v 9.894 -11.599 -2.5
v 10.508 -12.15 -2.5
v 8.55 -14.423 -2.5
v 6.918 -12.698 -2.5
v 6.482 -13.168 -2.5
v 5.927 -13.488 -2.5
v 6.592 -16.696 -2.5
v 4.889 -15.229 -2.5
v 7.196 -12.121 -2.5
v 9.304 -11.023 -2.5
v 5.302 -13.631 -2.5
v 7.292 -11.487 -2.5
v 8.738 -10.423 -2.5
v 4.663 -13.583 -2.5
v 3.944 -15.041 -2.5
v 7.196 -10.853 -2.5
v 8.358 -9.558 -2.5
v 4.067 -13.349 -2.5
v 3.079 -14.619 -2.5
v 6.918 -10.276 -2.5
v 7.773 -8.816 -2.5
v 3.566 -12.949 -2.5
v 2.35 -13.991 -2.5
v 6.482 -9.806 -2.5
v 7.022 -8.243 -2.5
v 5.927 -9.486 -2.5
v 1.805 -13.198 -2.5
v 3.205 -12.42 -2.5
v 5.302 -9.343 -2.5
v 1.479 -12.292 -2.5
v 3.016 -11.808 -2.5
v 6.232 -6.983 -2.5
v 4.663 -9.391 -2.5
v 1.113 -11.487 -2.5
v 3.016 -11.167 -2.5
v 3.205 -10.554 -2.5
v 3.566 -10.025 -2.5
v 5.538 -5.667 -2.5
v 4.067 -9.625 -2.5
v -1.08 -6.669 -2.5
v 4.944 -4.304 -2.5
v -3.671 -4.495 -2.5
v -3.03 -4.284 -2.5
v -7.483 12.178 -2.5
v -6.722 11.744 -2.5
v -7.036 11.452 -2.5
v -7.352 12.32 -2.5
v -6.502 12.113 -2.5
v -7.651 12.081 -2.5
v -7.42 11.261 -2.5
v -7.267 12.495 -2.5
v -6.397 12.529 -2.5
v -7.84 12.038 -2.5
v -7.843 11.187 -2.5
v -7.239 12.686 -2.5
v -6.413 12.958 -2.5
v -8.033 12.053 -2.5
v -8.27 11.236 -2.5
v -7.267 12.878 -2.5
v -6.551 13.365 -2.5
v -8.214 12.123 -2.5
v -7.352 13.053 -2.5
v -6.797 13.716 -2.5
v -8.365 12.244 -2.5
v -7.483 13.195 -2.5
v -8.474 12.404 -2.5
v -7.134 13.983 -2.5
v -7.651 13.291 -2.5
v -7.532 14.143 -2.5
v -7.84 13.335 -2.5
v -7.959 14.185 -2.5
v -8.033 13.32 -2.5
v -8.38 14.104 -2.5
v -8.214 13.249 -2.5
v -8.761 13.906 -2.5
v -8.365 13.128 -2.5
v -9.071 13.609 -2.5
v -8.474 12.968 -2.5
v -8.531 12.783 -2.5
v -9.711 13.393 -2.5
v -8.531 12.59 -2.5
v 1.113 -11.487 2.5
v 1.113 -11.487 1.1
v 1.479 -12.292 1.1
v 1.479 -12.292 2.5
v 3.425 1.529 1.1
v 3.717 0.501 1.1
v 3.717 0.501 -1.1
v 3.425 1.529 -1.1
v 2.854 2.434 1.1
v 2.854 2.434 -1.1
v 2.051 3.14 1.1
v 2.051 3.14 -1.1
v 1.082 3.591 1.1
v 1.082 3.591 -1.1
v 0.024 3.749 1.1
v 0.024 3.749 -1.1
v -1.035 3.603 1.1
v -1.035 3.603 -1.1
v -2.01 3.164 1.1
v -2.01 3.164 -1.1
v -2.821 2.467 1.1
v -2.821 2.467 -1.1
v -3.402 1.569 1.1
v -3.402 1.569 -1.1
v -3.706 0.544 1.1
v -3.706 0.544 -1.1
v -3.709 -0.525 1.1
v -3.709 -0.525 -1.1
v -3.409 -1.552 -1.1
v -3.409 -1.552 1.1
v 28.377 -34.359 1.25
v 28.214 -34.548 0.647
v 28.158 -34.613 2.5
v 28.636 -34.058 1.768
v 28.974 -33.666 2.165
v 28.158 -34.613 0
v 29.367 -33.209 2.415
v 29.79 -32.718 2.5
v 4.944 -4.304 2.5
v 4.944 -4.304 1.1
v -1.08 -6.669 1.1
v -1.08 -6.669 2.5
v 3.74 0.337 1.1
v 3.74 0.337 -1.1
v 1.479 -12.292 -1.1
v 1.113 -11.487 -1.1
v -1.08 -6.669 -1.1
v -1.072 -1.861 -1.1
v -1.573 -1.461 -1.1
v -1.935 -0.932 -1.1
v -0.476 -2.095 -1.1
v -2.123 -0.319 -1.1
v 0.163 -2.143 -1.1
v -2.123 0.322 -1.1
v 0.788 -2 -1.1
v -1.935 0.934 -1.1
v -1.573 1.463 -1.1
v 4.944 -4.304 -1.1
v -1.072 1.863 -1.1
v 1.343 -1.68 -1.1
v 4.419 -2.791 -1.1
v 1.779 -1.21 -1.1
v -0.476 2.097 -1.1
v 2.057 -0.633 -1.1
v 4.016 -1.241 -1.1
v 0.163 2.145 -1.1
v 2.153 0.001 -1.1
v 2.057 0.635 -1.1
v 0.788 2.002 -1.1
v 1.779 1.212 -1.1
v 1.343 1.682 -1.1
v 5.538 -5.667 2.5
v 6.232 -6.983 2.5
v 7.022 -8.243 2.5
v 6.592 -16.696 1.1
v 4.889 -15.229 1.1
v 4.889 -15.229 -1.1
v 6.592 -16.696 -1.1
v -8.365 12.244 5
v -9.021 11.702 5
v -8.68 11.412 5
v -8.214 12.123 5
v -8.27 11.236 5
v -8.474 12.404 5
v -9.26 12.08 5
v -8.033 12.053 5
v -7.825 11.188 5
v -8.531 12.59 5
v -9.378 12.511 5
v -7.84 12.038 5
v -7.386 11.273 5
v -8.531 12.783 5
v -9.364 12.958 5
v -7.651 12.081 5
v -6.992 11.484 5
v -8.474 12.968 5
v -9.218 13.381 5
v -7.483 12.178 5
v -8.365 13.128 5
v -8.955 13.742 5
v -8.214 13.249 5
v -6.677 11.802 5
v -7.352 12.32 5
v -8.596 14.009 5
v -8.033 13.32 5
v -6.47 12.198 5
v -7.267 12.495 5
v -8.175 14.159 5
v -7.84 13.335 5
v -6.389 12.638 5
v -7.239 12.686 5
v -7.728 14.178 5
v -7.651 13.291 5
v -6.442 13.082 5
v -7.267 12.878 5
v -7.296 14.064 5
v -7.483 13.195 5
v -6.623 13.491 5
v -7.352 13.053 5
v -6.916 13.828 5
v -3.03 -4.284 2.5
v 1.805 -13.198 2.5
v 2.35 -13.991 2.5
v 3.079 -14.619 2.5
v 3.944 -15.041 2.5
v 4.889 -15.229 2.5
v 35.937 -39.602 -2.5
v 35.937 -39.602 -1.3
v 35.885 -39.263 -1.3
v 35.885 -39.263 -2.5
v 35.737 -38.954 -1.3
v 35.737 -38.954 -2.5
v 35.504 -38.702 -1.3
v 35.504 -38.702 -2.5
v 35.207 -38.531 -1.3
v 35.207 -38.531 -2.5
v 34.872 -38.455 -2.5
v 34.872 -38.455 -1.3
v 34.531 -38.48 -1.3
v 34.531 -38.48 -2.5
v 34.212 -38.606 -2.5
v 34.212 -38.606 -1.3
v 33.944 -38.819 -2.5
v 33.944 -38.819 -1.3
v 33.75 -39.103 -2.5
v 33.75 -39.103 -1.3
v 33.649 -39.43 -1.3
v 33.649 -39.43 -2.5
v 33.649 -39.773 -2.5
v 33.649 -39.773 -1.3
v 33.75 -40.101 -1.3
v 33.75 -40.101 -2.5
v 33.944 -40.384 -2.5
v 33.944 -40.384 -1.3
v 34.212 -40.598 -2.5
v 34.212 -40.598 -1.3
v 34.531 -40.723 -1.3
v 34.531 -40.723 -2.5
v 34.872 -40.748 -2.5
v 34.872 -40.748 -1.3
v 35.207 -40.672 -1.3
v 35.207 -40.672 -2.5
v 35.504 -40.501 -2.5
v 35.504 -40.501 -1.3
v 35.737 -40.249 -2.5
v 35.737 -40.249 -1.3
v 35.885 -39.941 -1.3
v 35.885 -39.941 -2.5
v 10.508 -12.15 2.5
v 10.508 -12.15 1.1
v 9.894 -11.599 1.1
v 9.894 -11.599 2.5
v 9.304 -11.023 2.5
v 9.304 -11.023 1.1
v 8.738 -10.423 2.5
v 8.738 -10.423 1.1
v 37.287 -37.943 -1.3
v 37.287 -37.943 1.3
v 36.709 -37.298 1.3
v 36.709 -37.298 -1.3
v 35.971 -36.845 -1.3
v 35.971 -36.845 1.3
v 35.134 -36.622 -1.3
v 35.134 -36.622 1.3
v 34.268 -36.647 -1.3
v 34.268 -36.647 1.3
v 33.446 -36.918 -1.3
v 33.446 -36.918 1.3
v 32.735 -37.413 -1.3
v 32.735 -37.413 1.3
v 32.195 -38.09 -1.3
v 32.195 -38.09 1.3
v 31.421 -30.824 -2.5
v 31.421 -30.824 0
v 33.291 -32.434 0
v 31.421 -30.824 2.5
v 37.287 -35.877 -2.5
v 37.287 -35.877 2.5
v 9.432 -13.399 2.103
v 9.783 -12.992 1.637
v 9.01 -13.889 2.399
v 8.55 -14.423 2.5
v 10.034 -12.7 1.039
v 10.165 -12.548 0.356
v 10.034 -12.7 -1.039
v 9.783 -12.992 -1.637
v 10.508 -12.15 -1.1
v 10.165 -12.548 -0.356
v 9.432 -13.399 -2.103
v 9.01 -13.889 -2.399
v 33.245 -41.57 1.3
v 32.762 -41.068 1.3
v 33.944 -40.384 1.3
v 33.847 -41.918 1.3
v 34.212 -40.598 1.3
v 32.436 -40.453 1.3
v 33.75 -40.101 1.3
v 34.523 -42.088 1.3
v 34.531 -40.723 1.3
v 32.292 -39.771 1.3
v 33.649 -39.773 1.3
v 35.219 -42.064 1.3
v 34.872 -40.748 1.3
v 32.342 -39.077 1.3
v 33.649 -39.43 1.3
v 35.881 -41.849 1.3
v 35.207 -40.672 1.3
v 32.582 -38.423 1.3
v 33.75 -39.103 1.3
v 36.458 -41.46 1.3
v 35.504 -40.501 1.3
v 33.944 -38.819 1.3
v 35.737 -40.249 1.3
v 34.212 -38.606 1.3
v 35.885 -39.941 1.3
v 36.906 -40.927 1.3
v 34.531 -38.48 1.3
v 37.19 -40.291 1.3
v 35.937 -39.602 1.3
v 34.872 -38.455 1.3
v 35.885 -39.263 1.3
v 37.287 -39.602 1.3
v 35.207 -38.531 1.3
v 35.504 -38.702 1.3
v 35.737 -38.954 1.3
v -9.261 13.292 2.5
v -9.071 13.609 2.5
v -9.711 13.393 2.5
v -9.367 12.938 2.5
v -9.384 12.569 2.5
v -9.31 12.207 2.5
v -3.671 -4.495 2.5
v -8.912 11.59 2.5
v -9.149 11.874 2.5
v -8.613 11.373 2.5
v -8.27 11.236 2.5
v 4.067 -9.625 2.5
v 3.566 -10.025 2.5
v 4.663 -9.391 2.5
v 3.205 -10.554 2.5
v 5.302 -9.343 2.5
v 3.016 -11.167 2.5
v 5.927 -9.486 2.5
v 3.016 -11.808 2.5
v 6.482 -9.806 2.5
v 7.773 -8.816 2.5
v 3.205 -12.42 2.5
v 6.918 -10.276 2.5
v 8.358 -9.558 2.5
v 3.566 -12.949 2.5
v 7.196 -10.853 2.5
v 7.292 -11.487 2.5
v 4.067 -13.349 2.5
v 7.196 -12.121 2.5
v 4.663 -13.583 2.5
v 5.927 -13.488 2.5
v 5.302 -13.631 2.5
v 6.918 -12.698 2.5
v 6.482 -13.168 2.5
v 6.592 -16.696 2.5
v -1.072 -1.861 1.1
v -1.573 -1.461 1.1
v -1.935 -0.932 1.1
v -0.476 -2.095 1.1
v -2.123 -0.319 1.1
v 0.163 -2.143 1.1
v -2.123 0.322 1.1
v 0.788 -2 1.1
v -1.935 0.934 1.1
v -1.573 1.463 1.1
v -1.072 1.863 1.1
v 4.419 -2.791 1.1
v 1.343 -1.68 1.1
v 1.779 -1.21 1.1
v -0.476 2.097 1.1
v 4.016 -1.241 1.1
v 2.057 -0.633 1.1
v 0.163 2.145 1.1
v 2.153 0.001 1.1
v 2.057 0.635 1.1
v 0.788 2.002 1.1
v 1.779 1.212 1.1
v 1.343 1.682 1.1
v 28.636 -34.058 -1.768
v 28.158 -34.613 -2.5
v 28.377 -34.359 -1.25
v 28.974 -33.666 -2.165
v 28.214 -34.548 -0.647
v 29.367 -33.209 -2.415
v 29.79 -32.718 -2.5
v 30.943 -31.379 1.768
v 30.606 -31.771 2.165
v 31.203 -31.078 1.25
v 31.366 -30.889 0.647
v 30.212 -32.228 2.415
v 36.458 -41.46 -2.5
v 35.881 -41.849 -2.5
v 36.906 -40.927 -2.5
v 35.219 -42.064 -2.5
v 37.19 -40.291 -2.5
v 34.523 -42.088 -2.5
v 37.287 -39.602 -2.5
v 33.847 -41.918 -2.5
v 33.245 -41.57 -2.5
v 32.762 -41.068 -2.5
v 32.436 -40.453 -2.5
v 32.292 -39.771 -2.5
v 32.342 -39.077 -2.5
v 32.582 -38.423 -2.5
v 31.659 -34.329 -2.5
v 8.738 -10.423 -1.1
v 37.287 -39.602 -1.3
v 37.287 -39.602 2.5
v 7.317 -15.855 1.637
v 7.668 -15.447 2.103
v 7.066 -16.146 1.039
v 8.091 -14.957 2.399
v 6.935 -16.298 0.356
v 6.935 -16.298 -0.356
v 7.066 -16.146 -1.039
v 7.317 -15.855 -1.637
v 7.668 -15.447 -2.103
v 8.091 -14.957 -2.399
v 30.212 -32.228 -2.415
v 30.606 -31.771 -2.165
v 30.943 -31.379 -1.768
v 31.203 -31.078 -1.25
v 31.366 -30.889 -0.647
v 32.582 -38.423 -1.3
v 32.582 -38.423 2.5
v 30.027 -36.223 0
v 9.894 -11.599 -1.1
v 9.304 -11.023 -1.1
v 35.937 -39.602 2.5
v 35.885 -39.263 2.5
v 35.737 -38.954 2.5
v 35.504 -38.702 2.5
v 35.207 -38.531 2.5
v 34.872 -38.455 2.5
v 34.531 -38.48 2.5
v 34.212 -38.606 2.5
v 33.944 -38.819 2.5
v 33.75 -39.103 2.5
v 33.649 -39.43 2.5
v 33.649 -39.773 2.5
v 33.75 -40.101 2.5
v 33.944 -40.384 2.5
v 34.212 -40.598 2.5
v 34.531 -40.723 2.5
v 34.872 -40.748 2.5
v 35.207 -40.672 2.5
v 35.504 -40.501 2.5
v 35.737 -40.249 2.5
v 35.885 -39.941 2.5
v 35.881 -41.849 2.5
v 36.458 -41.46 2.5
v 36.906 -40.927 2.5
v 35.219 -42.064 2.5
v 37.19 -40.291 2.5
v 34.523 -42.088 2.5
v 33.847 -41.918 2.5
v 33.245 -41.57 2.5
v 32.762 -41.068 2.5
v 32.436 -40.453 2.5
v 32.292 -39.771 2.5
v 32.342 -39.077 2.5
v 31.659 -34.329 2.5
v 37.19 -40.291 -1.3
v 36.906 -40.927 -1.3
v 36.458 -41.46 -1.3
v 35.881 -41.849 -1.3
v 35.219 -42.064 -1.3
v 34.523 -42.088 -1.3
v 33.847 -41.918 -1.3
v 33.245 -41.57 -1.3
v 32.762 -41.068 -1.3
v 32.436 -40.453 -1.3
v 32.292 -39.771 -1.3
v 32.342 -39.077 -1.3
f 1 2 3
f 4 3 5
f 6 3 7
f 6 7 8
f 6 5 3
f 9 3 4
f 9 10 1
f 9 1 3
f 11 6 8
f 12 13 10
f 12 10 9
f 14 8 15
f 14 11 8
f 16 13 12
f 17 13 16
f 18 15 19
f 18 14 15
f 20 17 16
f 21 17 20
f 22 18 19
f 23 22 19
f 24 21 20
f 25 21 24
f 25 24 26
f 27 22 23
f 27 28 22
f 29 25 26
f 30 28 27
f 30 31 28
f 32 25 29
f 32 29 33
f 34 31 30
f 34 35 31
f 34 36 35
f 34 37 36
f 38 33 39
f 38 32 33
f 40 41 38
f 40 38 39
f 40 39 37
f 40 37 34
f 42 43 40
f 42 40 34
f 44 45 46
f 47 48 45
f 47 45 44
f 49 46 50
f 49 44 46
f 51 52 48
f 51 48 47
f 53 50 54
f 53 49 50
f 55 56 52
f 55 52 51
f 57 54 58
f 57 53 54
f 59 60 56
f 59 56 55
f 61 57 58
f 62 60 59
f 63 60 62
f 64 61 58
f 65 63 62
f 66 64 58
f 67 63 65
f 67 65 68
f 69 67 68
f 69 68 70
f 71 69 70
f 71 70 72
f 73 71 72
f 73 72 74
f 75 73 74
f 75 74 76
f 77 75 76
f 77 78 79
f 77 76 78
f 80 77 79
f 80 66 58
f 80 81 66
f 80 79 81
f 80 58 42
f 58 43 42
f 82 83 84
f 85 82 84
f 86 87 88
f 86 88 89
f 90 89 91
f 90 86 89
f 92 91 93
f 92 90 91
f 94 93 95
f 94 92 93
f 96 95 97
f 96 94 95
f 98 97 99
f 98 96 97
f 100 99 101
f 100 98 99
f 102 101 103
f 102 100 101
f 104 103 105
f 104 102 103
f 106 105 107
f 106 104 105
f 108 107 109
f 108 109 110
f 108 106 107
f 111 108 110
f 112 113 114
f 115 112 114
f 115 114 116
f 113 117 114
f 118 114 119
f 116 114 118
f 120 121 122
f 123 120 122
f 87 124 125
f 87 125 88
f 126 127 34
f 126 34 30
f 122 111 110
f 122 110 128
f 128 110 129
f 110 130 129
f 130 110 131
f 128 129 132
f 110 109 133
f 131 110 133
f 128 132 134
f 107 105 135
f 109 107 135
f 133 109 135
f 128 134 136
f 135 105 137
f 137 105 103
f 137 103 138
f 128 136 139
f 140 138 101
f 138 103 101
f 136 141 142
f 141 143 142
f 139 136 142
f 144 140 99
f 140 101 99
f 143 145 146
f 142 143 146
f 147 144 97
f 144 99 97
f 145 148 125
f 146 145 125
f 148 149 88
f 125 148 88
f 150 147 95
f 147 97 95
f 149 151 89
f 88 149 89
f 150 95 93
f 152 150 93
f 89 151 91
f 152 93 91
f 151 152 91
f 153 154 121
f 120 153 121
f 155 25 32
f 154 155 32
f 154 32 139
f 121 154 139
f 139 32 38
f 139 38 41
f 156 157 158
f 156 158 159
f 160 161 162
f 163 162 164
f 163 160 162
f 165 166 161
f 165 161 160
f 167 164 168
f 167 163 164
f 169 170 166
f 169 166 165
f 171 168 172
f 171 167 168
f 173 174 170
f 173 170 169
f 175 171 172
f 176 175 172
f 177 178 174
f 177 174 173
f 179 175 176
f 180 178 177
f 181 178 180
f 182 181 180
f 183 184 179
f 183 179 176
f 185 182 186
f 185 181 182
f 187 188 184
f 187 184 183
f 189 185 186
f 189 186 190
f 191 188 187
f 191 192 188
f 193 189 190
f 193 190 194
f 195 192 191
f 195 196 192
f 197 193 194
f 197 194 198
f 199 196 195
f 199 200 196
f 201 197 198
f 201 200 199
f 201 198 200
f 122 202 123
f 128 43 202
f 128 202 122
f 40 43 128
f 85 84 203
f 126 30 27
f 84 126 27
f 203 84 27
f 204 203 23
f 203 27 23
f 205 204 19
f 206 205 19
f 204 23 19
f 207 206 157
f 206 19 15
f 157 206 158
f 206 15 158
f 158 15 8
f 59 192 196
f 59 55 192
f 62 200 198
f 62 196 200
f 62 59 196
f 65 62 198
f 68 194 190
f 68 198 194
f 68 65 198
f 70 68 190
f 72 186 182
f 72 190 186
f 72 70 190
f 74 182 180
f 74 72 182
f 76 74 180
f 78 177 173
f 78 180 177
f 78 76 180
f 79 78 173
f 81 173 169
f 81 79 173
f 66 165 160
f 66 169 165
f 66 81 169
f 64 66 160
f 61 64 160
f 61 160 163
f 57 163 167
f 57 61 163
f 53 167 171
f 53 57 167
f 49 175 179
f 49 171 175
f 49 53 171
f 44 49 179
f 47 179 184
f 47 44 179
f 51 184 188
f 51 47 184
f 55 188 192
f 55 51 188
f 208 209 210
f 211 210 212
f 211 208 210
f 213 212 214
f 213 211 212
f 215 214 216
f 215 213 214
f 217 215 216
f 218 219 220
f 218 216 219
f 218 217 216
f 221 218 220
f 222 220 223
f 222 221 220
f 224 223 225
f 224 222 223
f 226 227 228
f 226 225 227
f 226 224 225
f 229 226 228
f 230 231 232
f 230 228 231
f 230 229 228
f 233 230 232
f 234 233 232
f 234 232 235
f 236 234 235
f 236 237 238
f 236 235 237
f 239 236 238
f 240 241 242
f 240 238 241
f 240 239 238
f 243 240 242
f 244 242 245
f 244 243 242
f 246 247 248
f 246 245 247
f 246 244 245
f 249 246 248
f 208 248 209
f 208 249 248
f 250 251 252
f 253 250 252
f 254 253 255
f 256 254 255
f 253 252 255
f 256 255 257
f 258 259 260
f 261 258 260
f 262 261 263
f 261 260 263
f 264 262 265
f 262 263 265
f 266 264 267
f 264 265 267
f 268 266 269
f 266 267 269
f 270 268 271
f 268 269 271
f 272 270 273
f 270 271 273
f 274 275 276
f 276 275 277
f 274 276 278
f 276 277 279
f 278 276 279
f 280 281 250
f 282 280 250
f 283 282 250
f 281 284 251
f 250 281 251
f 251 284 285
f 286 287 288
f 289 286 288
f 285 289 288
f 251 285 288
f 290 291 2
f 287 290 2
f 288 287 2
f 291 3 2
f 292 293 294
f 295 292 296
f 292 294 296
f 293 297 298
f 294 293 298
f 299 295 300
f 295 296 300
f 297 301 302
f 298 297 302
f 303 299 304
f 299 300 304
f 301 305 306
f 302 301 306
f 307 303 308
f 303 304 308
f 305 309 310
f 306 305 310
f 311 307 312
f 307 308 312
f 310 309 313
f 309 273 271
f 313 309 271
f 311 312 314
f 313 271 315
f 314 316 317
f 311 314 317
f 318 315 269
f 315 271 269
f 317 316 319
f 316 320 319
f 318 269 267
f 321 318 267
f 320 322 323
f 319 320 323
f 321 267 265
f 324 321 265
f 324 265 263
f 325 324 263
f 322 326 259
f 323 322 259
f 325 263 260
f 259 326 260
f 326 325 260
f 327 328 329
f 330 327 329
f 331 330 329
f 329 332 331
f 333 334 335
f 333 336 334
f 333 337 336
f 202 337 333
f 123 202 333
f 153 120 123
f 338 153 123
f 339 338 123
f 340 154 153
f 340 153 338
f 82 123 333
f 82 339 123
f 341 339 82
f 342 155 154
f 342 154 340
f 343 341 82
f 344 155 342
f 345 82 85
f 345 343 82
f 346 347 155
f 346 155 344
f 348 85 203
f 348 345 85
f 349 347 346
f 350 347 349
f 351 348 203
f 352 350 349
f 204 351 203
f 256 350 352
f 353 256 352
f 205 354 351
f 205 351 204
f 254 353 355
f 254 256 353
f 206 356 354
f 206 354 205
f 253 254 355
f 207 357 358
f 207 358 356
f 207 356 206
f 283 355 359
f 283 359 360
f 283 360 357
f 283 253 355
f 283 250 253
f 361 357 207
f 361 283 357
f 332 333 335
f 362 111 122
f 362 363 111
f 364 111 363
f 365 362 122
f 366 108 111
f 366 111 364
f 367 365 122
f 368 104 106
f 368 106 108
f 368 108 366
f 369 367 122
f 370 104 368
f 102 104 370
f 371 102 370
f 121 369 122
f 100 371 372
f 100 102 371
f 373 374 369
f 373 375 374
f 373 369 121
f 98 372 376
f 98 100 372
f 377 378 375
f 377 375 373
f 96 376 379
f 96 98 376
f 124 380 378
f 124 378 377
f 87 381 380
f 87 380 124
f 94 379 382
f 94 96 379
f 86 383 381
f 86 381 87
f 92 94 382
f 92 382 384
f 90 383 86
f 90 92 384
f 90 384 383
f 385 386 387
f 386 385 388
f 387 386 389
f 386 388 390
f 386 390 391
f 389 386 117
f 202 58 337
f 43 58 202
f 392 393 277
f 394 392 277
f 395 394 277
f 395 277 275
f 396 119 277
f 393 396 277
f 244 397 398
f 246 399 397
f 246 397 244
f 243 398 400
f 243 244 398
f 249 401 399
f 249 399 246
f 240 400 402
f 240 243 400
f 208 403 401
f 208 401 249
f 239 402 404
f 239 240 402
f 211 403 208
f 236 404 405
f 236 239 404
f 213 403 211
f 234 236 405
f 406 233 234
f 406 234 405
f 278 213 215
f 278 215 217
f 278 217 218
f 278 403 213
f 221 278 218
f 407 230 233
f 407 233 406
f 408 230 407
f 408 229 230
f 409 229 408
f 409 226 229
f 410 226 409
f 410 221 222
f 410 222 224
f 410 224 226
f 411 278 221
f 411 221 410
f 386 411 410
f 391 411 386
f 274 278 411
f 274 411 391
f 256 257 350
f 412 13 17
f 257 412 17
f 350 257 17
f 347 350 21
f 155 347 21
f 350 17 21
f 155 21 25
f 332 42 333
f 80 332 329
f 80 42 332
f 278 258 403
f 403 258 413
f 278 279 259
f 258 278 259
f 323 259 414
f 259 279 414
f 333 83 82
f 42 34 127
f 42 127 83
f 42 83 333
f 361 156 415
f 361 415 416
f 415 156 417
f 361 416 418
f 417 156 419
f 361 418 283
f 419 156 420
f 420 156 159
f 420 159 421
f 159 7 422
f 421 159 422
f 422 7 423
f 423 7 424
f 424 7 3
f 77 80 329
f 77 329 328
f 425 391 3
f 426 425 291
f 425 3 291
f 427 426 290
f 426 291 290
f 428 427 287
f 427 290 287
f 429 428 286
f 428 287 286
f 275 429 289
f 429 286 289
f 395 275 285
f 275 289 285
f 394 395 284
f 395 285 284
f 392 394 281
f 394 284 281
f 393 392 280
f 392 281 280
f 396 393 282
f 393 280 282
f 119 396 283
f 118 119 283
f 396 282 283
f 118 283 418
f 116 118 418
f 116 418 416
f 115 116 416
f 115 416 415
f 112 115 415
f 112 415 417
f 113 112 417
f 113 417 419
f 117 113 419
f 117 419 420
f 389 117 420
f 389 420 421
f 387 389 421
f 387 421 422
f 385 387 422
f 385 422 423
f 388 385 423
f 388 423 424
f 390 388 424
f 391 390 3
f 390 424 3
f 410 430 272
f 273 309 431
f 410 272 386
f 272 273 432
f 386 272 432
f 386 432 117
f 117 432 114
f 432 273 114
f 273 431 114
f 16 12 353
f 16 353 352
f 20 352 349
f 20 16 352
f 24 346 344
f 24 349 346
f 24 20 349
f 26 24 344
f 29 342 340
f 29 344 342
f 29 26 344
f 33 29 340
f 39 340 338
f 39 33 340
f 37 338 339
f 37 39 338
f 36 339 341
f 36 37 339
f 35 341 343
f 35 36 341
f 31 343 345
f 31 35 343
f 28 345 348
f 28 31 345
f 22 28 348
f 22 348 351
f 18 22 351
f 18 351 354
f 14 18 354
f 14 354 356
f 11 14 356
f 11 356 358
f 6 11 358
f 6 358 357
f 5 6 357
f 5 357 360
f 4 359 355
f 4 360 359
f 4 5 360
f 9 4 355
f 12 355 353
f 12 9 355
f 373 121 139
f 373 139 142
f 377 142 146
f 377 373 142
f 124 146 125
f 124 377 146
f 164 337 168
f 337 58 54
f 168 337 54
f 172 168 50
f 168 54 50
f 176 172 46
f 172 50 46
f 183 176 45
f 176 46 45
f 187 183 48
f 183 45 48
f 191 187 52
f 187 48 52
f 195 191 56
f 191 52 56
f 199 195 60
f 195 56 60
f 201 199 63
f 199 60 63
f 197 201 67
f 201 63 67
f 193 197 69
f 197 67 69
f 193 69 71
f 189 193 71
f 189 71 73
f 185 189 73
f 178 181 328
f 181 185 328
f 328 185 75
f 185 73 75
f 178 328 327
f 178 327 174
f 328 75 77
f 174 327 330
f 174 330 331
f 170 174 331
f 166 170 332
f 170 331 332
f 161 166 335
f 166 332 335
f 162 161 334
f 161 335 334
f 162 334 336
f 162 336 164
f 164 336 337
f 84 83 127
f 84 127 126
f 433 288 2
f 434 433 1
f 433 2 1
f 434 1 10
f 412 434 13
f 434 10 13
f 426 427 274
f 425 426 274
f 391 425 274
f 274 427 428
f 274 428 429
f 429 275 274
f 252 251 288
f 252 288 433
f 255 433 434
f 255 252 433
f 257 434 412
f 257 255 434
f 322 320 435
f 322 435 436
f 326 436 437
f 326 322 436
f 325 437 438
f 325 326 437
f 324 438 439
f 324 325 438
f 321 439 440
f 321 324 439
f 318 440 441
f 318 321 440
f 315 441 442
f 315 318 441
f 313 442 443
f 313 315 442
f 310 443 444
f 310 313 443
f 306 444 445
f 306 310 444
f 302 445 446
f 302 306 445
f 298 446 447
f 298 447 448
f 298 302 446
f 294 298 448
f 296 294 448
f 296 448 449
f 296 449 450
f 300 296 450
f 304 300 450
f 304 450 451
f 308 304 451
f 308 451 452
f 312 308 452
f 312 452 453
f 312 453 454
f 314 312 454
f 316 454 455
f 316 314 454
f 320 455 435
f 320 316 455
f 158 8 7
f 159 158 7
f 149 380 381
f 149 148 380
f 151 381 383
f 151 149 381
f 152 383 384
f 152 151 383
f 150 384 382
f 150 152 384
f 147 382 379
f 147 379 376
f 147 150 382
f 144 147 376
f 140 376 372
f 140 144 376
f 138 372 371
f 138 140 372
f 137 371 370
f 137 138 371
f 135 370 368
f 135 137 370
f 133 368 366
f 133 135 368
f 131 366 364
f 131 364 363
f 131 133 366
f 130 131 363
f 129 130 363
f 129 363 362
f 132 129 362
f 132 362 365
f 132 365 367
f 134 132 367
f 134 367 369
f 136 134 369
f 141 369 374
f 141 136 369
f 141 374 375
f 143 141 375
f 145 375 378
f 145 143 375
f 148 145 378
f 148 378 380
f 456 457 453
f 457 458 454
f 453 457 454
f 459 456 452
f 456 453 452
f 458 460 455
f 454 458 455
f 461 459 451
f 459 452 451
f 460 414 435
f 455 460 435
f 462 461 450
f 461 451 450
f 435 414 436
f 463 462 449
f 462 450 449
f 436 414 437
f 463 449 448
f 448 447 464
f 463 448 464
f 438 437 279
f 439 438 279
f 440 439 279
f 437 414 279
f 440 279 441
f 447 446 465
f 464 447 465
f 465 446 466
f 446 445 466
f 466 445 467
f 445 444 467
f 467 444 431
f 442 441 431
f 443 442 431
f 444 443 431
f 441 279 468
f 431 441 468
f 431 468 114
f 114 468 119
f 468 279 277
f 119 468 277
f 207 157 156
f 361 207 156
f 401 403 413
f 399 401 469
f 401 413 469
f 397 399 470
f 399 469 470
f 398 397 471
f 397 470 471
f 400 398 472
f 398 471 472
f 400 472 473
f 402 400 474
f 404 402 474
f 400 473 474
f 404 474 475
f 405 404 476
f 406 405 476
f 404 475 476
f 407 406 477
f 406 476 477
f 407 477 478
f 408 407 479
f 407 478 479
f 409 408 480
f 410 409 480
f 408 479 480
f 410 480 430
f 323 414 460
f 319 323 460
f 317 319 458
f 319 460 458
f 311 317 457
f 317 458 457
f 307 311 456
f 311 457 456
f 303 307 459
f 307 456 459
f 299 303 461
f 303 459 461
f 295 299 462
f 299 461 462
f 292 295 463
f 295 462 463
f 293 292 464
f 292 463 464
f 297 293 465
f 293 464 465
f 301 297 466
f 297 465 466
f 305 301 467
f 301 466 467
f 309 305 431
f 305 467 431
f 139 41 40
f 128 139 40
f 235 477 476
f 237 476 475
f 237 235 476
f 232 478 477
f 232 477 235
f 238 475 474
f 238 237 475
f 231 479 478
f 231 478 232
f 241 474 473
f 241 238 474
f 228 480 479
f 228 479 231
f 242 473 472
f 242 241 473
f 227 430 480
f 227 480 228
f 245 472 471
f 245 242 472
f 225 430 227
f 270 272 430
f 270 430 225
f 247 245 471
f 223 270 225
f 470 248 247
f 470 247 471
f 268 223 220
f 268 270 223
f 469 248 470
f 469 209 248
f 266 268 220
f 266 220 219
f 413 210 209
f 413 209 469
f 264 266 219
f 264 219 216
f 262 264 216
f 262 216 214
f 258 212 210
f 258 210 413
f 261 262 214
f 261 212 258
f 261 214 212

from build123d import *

# Parameters (mm, degrees)
SKETCH1_R               = 3.748314074
SKETCH1_R_2             = 2.15
BOSS_EXTRUDE1_DEPTH     = 1.1
BOSS_EXTRUDE2_START     = -2.5
BOSS_EXTRUDE2_DEPTH     = 5
SKETCH3_R               = 2.5
BOSS_EXTRUDE3_DEPTH     = 30.5
BOSS_EXTRUDE4_REACH     = 66.583
CUT_EXTRUDE1_DEPTH      = 77.014827373
CUT_EXTRUDE1_DEPTH_BACK = 77.014827373
SKETCH5_R               = 2.15
SKETCH6_R               = 1.15
BOSS_EXTRUDE5_DEPTH     = 2.5
SKETCH7_R               = 3
CUT_EXTRUDE2_DEPTH      = 1.3
BOSS_EXTRUDE6_START     = -7.5
SKETCH8_R               = 1.5
BOSS_EXTRUDE6_DEPTH     = 7.5
CUT_EXTRUDE3_DEPTH      = 77.681407452
CUT_EXTRUDE3_DEPTH_BACK = 77.681407452
SKETCH9_R               = 0.65


with BuildPart() as part:
    # Sketch1 → Boss-Extrude1 (new, symmetric)
    # profile 1 of 2: a face of its own
    with BuildSketch(Plane.XY):
        with BuildLine():
            Line((-29.007745084, 30.523910578), (-25.091893995, 35.069909945))
            ThreePointArc((-25.091893995, 35.069909945), (-29.621942143, 40.692126277), (-31.860472098, 47.55650071))
            Line((-31.860472098, 47.55650071), (-31.88258847, 47.720887837))
            ThreePointArc((-31.88258847, 47.720887837), (-31.857495615, 47.471553034), (-31.84911885, 47.221098797))
            ThreePointArc((-31.84911885, 47.221098797), (-34.80303687, 43.557931682), (-39.009027568, 45.6683978))
            Line((-39.009027568, 45.6683978), (-34.12097225, 34.928362615))
            Line((-34.12097225, 34.928362615), (-29.007745084, 30.523910578))
        make_face()
    # profile 2 of 2: a face of its own
    with BuildSketch(Plane.XY):
        with Locations((-35.597432924, 47.221098797)):
            Circle(SKETCH1_R)
        with Locations((-35.597432924, 47.221098797)):
            Circle(SKETCH1_R_2, mode=Mode.SUBTRACT)
    extrude(amount=BOSS_EXTRUDE1_DEPTH, both=True)

    # Boss-Extrude2: read off the stored shape, not the designer's step
    # Boss-Extrude2 outline → Boss-Extrude2 (add)
    with BuildSketch(Plane.XY.offset(BOSS_EXTRUDE2_START)):
        with BuildLine():
            ThreePointArc((-25.091893995, 35.069909945), (-26.003854199, 35.905963494), (-26.862376119, 36.796804144))
            ThreePointArc((-26.862376119, 36.796804144), (-27.511007835, 38.051535597), (-28.577777167, 38.977320299))
            ThreePointArc((-28.577777167, 38.977320299), (-29.726956647, 40.888456377), (-30.656228901, 42.915648441))
            Line((-30.656228901, 42.915648441), (-36.680056275, 40.551182055))
            Line((-36.680056275, 40.551182055), (-34.12097225, 34.928362615))
            ThreePointArc((-34.12097225, 34.928362615), (-32.905703874, 32.891668535), (-30.711472725, 31.991474297))
            Line((-30.711472725, 31.991474297), (-29.007745084, 30.523910578))
            Line((-29.007745084, 30.523910578), (-25.091893995, 35.069909945))
        make_face()
    extrude(amount=BOSS_EXTRUDE2_DEPTH)

    # Sketch3 → Boss-Extrude3 (add)
    with BuildSketch(Plane(origin=(-31.745759068, 27.345288728, 0), x_dir=(0, 0, -1), z_dir=(0.7576665611269928, -0.6526418482981281, 0))):
        with Locations((0, 7.195277993)):
            Circle(SKETCH3_R)
    extrude(amount=BOSS_EXTRUDE3_DEPTH)

    # Boss-Extrude4: up to this face of the body (flat: up to its plane)
    boss_extrude4_end = Plane(part.part.faces().sort_by_distance((-30.992912772, 36.816549457, 2.5))[0])
    # Sketch4 → Boss-Extrude4 (add, up to the picked face)
    with BuildSketch(Plane(origin=(0, 0, -2.5), x_dir=(-1, 0, 0), z_dir=(0, 0, -1)), mode=Mode.PRIVATE) as boss_extrude4_sk1:
        Polygon((44.67104718, 60.829350293), (38.62968166, 42.935799229), (36.680056275, 40.551182055), (34.487145344, 35.732918139), (39.271055483, 42.725492907), (45.31052994, 60.613442948), align=None)
    boss_extrude4_tool1 = split(extrude(boss_extrude4_sk1.sketch, amount=-BOSS_EXTRUDE4_REACH, mode=Mode.PRIVATE), bisect_by=boss_extrude4_end, keep=Keep.BOTH, mode=Mode.PRIVATE)
    add(boss_extrude4_tool1.solids().sort_by(Axis((-40.62976, 48.582602, -2.5), (0, 0, 1)))[0])

    # Sketch5 → Cut-Extrude1 (cut, two sides: drawn at the far end of the back side and taken through both)
    with BuildSketch(Plane.XY.offset(2.5).offset(-CUT_EXTRUDE1_DEPTH_BACK)):
        with Locations((-30.458296942, 35.732918139)):
            Circle(SKETCH5_R)
    extrude(amount=CUT_EXTRUDE1_DEPTH + CUT_EXTRUDE1_DEPTH_BACK, mode=Mode.SUBTRACT)

    # Sketch6 → Boss-Extrude5 (add, symmetric)
    with BuildSketch(Plane.XY):
        with BuildLine():
            Line((-3.018256327, 8.79690186), (-7.441885155, 12.607344927))
            Line((-7.441885155, 12.607344927), (-4.178675914, 16.395677733))
            Line((-4.178675914, 16.395677733), (1.686549766, 11.343466212))
            Line((1.686549766, 11.343466212), (1.686549766, 7.618415505))
            ThreePointArc((1.686549766, 7.618415505), (-1.420897666, 5.193336616), (-3.018256327, 8.79690186))
        make_face()
        with Locations((-0.813450234, 7.618415505)):
            Circle(SKETCH6_R, mode=Mode.SUBTRACT)
    extrude(amount=BOSS_EXTRUDE5_DEPTH, both=True)

    # Sketch7 → Cut-Extrude2 (cut, symmetric)
    with BuildSketch(Plane.XY):
        with Locations((-0.813450234, 7.618415505)):
            Circle(SKETCH7_R)
    extrude(amount=CUT_EXTRUDE2_DEPTH, both=True, mode=Mode.SUBTRACT)

    # Sketch8 → Boss-Extrude6 (add)
    with BuildSketch(Plane.XY.offset(2.5).offset(BOSS_EXTRUDE6_START)):
        with Locations(Location((-43.488619522, 59.906385053, 0), (0, 0, 255.286714902))):
            Circle(SKETCH8_R)
    extrude(amount=BOSS_EXTRUDE6_DEPTH)

    # Sketch9 → Cut-Extrude3 (cut, two sides: drawn at the far end of the back side and taken through both)
    with BuildSketch(Plane.XY.offset(2.5).offset(-CUT_EXTRUDE3_DEPTH_BACK)):
        with Locations((-43.488619522, 59.906385053)):
            Circle(SKETCH9_R)
    extrude(amount=CUT_EXTRUDE3_DEPTH + CUT_EXTRUDE3_DEPTH_BACK, mode=Mode.SUBTRACT)


with BuildPart() as part_1:
    # Body-Move/Copy1: moved
    add(part.part.moved(Location((35.6, -47.22, 0))))


with BuildPart() as body_2:
    # Split1: read off the stored shape, not the designer's step
    # Split1: the piece on the far side of the plane
    add(part_1.part)
    split(bisect_by=Plane.XY.offset(-2.5), keep=Keep.BOTTOM)


with BuildPart() as part_2:
    add(part_1.part)

    # Split1
    split(bisect_by=Plane.XY.offset(-2.5), keep=Keep.TOP)


with BuildPart() as body_2_1:
    # Body-Move/Copy2: read off the stored shape, not the designer's step
    # Body-Move/Copy2: moved
    add(body_2.part.moved(Location((0, 0, 7.5))))


with BuildPart() as part_3:
    add(part_2.part)

    # Combine1: read off the stored shape, not the designer's step
    # Combine1: union body 2
    add(body_2_1.part)


solid = part_3.part
